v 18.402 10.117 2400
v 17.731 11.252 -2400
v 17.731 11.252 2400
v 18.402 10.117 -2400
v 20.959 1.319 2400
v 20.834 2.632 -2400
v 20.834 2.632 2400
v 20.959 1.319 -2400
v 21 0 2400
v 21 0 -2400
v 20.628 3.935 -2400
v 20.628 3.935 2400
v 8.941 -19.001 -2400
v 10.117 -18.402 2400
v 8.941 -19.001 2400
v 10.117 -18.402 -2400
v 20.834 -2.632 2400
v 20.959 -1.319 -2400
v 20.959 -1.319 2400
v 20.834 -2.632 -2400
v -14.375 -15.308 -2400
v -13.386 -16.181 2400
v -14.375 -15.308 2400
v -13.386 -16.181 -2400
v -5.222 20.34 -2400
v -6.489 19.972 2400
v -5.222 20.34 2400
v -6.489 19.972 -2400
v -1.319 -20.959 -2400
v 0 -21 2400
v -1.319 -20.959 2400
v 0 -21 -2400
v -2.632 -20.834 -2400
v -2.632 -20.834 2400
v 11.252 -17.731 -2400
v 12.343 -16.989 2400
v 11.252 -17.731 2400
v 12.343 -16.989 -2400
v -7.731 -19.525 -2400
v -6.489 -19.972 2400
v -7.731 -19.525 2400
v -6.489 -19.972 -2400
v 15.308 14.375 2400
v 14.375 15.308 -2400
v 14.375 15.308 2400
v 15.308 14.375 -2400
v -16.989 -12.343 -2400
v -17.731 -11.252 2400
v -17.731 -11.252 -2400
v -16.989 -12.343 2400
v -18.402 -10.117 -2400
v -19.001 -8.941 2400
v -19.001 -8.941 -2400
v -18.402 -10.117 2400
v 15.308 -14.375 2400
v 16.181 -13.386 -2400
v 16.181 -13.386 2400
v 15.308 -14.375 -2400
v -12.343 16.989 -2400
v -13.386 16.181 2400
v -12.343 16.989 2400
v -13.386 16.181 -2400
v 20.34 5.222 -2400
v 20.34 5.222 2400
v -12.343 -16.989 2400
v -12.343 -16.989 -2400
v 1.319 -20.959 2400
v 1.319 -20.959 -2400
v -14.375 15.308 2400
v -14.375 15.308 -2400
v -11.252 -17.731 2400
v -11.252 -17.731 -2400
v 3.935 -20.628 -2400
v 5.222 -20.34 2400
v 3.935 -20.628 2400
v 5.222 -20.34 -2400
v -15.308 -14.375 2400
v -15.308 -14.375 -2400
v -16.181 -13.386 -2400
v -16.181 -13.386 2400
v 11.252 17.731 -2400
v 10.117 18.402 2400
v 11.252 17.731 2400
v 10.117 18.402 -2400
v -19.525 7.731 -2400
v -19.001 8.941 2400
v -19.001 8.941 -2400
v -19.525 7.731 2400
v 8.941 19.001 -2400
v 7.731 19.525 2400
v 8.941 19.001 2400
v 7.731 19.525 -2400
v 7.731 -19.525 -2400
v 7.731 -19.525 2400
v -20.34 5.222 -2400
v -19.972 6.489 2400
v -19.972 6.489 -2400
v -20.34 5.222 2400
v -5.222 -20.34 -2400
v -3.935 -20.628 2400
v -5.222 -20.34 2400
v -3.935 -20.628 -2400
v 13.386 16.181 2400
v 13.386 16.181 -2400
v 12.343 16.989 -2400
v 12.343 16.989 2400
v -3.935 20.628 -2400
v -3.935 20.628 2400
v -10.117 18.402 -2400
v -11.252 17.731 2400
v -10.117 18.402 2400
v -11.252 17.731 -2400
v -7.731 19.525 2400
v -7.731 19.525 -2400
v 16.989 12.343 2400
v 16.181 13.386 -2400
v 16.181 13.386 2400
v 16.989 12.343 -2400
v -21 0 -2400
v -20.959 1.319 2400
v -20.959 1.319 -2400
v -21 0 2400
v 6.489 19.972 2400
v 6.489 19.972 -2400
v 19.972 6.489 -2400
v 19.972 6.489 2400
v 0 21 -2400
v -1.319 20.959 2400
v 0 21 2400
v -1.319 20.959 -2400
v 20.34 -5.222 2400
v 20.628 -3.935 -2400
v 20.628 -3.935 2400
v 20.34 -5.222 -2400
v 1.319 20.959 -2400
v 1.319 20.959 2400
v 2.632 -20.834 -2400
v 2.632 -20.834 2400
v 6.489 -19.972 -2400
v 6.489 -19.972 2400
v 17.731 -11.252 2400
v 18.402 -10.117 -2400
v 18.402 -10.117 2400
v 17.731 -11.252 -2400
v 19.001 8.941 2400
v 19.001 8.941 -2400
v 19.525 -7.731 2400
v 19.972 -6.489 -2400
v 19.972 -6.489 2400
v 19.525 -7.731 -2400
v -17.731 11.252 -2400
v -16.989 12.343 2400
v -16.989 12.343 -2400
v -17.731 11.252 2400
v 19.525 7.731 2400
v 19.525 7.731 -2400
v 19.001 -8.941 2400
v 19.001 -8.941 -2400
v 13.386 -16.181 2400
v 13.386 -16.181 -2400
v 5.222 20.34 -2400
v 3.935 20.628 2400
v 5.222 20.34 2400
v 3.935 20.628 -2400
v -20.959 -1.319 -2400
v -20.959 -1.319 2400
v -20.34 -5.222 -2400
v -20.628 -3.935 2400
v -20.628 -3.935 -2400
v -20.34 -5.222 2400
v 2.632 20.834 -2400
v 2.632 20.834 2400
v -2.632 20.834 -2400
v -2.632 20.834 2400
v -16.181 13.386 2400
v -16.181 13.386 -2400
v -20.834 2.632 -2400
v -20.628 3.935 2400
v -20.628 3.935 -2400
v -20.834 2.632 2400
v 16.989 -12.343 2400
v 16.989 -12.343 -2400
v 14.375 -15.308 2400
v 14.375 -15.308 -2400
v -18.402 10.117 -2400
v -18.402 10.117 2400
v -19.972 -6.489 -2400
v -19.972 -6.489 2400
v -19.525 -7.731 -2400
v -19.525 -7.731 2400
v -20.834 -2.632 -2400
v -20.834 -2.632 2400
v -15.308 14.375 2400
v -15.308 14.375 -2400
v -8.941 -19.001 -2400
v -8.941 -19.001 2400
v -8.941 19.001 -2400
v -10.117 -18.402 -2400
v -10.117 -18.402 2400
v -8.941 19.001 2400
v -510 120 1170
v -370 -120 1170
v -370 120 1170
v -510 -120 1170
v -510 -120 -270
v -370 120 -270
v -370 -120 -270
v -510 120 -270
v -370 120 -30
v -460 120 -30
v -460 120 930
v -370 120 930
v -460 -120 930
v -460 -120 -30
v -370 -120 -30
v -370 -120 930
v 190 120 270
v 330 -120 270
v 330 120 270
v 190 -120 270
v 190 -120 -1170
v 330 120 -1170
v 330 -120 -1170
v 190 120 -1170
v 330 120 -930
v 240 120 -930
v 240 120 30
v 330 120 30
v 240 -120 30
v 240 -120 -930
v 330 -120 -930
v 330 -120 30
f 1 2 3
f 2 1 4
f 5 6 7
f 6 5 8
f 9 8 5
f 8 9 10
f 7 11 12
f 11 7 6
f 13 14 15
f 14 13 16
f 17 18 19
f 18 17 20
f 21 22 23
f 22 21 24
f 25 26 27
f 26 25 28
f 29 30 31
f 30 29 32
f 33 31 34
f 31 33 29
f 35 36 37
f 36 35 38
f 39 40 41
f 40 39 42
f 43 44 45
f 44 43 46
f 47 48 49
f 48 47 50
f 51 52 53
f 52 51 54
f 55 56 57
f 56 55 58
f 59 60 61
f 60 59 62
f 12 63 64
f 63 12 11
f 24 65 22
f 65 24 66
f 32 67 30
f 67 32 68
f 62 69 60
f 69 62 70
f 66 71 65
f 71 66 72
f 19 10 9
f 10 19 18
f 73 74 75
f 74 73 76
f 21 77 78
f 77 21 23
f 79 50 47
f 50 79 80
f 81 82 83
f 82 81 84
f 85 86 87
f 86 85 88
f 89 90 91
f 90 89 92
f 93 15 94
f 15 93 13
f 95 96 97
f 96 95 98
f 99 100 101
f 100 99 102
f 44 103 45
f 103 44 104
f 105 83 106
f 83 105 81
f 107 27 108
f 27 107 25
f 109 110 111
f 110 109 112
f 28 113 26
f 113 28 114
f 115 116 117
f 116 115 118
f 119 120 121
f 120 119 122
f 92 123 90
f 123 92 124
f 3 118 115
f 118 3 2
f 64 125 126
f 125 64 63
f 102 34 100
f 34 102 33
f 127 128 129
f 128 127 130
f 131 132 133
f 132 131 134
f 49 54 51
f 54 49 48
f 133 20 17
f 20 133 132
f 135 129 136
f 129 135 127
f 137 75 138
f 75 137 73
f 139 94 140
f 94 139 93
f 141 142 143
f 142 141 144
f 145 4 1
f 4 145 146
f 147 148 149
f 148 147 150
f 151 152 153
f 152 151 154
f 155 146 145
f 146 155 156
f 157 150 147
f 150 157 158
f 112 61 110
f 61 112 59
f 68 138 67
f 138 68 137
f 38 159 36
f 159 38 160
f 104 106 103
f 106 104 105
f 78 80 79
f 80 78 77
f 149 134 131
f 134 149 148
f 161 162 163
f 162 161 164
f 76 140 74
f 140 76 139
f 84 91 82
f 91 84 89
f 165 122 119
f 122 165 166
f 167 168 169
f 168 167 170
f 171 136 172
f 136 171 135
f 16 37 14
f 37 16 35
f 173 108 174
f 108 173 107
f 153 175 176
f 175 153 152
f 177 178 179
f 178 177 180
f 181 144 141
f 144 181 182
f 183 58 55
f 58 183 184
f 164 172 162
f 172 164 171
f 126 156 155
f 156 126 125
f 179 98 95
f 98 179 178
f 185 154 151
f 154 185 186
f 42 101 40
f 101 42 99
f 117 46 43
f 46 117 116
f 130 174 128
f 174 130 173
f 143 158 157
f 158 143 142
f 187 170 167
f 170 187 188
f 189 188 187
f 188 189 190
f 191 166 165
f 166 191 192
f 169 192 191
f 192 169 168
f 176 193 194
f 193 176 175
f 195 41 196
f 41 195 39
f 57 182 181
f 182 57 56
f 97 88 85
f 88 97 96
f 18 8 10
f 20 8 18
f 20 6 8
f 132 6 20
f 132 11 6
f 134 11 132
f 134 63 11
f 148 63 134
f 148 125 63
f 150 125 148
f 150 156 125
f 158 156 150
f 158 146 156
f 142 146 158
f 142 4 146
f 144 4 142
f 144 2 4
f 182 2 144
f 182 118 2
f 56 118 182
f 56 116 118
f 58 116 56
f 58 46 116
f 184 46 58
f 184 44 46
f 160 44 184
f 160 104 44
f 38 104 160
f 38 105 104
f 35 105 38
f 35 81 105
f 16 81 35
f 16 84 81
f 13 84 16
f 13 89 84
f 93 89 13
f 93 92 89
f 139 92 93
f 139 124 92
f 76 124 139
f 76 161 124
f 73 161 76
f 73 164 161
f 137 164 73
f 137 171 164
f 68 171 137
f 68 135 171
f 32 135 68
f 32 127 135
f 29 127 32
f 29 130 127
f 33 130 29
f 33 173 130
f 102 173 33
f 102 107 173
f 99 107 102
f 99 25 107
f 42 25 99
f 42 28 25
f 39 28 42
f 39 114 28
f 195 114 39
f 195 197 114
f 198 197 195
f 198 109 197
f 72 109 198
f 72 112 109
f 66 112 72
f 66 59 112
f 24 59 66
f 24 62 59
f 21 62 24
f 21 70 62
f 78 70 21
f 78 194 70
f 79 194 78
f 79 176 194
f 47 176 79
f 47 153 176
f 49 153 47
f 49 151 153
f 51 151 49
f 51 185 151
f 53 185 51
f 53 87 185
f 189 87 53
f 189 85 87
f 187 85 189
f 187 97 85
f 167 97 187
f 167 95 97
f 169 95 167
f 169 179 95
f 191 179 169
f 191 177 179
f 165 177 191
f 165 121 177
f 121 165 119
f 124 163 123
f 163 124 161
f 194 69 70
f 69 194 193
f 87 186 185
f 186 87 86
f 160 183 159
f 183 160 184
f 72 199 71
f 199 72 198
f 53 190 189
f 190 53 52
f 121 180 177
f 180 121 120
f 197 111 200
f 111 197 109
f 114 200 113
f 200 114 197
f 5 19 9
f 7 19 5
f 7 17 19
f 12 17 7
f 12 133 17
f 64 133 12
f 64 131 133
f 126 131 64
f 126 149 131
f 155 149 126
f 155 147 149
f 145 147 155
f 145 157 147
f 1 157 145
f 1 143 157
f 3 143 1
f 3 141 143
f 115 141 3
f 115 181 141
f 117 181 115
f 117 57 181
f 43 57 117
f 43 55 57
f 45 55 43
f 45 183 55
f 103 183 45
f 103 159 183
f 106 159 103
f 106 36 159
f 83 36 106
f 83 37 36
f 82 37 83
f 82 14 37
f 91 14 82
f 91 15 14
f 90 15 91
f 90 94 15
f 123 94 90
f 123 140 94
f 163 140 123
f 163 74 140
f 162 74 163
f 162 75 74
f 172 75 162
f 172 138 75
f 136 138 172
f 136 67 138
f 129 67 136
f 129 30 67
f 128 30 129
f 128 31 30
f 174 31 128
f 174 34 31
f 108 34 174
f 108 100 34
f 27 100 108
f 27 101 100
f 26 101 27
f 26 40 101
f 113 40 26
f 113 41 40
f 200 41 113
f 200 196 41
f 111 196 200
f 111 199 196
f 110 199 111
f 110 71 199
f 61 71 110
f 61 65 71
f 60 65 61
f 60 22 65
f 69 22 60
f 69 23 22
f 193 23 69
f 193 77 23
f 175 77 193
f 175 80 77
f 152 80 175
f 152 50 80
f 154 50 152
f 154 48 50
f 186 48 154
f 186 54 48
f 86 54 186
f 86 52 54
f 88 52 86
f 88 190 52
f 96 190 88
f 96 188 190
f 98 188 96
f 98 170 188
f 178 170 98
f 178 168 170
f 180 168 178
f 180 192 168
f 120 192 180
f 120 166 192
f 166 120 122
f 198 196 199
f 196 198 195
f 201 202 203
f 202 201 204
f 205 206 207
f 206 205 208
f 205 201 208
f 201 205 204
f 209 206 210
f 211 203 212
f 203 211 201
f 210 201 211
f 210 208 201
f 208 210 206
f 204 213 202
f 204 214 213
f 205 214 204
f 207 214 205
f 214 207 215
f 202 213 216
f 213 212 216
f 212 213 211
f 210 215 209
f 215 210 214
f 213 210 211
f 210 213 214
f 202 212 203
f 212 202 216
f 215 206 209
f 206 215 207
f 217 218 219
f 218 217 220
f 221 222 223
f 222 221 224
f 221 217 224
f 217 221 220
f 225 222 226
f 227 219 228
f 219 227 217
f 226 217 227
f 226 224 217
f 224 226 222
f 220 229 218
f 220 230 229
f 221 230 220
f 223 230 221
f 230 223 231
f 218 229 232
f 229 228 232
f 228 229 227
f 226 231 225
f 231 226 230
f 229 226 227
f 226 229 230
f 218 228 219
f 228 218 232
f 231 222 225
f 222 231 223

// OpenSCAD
// ============================================================================
// PROJECT: XXXG-00W0 WING GUNDAM ZERO EW - WEAPON FABRICATION CORES
// COMPONENT VAULT: BANDAI CAST RUNNER D - UPPER RIFLE RAILS D11 & D12
// RE-ARCHITECTURE PACKAGING: BARREL-TYPE SUB-ARMOR CAPACITOR STORAGE RECESSES
// SYSTEM COMPATIBILITY: CONTINUOUS OPEN-ENDED DOUBLE-VENTED DISCHARGE PARITY
// ============================================================================

$fn = 100; // Circular segment rendering resolution count

// Structural Constants Scaled 1:1 for a 16.7-Meter Airframe Scale (mm)
rail_total_length = 3200;                // Total longitudinal vertical height (mm)
rail_outer_width = 320;                 // Transverse casing base width (mm)
armor_skin_thickness = 50;              // Solid TiAl protective plating wall (mm)
harness_conduit_width = 40;             // Cast-in 4oz copper logic trace track (mm)
capacitor_pocket_depth = 15;            // Sub-armor recessed housing pocket depth (mm)
capacitor_pocket_width = 110;           // Transverse MLCC array pocket width (mm)

module Runner_D_Rifle_Rail_Forge() {
    // Central Supply Injection Runner Axis (Molten Feed Line from Siphon Forge)
    color([0.25, 0.25, 0.28]) {
        cylinder(h = rail_total_length * 1.5, d = 42, center = true);
        // Direct injection gates tracking straight into the part mold cavities
        translate() rotate() cylinder(h = 450, d = 22);
        translate([0, 0, -450]) rotate() cylinder(h = 450, d = 22);
    }
    
    // Instantiate Scaled Skeutomorphic Part Molds Symmetrically (Left & Right)
    Cast_Upper_Weapon_Rails();
}

module Cast_Upper_Weapon_Rails() {
    // ---- PART D11: UPPER LEFT RIFLE CASING RAIL SPINE ---- [Page 8, Step 10]
    translate([-350, 0, 450]) color([0.5, 0.5, 0.55]) { // Weapon Metallic Casing Spec
        difference() {
            // Main solid heavy-duty rifle reinforcement spine panel
            cube([rail_outer_width, 240, rail_total_length * 0.45], center = true);
            
            // Pressure Expansion Slot Cutout (Vents hot ionized air for open-bore)
            cube([rail_outer_width - (armor_skin_thickness * 2), 300, rail_total_length * 0.3], center = true);
            
            // SUB-ARMOR RECESSED CAPACITOR POCKETS [Segmented rows cut inside the rail lining]
            for (z_offset = [-200, 0, 200]) {
                translate([(rail_outer_width/2 - armor_skin_thickness + capacitor_pocket_depth/2), 0, z_offset])
                    cube([capacitor_pocket_depth, capacitor_pocket_width, 140], center = true);
            }
            
            // Continuous cast-in routing track for the 4oz solid-state wiring rails
            cube([harness_conduit_width, 300, rail_total_length], center = true);
            
            // Slicing profile tool to generate an asymmetrical half-shell part component
            translate([rail_outer_width, 0, 0])
                cube([rail_outer_width * 2, 500, rail_total_length], center = true);
        }
    }
    
    // ---- PART D12: UPPER RIGHT RIFLE CASING RAIL SPINE ---- [Page 8, Step 10]
    translate([350, 0, -450]) rotate() color([0.5, 0.5, 0.55]) {
        difference() {
            cube([rail_outer_width, 240, rail_total_length * 0.45], center = true);
            cube([rail_outer_width - (armor_skin_thickness * 2), 300, rail_total_length * 0.3], center = true);
            
            for (z_offset = [-200, 0, 200]) {
                translate([(rail_outer_width/2 - armor_skin_thickness + capacitor_pocket_depth/2), 0, z_offset])
                    cube([capacitor_pocket_depth, capacitor_pocket_width, 140], center = true);
            }
            
            cube([harness_conduit_width, 300, rail_total_length], center = true);
            translate([rail_outer_width, 0, 0])
                cube([rail_outer_width * 2, 500, rail_total_length], center = true);
        }
    }
}

// Render Master Assembly to Parameter Workspace
Runner_D_Rifle_Rail_Forge();
